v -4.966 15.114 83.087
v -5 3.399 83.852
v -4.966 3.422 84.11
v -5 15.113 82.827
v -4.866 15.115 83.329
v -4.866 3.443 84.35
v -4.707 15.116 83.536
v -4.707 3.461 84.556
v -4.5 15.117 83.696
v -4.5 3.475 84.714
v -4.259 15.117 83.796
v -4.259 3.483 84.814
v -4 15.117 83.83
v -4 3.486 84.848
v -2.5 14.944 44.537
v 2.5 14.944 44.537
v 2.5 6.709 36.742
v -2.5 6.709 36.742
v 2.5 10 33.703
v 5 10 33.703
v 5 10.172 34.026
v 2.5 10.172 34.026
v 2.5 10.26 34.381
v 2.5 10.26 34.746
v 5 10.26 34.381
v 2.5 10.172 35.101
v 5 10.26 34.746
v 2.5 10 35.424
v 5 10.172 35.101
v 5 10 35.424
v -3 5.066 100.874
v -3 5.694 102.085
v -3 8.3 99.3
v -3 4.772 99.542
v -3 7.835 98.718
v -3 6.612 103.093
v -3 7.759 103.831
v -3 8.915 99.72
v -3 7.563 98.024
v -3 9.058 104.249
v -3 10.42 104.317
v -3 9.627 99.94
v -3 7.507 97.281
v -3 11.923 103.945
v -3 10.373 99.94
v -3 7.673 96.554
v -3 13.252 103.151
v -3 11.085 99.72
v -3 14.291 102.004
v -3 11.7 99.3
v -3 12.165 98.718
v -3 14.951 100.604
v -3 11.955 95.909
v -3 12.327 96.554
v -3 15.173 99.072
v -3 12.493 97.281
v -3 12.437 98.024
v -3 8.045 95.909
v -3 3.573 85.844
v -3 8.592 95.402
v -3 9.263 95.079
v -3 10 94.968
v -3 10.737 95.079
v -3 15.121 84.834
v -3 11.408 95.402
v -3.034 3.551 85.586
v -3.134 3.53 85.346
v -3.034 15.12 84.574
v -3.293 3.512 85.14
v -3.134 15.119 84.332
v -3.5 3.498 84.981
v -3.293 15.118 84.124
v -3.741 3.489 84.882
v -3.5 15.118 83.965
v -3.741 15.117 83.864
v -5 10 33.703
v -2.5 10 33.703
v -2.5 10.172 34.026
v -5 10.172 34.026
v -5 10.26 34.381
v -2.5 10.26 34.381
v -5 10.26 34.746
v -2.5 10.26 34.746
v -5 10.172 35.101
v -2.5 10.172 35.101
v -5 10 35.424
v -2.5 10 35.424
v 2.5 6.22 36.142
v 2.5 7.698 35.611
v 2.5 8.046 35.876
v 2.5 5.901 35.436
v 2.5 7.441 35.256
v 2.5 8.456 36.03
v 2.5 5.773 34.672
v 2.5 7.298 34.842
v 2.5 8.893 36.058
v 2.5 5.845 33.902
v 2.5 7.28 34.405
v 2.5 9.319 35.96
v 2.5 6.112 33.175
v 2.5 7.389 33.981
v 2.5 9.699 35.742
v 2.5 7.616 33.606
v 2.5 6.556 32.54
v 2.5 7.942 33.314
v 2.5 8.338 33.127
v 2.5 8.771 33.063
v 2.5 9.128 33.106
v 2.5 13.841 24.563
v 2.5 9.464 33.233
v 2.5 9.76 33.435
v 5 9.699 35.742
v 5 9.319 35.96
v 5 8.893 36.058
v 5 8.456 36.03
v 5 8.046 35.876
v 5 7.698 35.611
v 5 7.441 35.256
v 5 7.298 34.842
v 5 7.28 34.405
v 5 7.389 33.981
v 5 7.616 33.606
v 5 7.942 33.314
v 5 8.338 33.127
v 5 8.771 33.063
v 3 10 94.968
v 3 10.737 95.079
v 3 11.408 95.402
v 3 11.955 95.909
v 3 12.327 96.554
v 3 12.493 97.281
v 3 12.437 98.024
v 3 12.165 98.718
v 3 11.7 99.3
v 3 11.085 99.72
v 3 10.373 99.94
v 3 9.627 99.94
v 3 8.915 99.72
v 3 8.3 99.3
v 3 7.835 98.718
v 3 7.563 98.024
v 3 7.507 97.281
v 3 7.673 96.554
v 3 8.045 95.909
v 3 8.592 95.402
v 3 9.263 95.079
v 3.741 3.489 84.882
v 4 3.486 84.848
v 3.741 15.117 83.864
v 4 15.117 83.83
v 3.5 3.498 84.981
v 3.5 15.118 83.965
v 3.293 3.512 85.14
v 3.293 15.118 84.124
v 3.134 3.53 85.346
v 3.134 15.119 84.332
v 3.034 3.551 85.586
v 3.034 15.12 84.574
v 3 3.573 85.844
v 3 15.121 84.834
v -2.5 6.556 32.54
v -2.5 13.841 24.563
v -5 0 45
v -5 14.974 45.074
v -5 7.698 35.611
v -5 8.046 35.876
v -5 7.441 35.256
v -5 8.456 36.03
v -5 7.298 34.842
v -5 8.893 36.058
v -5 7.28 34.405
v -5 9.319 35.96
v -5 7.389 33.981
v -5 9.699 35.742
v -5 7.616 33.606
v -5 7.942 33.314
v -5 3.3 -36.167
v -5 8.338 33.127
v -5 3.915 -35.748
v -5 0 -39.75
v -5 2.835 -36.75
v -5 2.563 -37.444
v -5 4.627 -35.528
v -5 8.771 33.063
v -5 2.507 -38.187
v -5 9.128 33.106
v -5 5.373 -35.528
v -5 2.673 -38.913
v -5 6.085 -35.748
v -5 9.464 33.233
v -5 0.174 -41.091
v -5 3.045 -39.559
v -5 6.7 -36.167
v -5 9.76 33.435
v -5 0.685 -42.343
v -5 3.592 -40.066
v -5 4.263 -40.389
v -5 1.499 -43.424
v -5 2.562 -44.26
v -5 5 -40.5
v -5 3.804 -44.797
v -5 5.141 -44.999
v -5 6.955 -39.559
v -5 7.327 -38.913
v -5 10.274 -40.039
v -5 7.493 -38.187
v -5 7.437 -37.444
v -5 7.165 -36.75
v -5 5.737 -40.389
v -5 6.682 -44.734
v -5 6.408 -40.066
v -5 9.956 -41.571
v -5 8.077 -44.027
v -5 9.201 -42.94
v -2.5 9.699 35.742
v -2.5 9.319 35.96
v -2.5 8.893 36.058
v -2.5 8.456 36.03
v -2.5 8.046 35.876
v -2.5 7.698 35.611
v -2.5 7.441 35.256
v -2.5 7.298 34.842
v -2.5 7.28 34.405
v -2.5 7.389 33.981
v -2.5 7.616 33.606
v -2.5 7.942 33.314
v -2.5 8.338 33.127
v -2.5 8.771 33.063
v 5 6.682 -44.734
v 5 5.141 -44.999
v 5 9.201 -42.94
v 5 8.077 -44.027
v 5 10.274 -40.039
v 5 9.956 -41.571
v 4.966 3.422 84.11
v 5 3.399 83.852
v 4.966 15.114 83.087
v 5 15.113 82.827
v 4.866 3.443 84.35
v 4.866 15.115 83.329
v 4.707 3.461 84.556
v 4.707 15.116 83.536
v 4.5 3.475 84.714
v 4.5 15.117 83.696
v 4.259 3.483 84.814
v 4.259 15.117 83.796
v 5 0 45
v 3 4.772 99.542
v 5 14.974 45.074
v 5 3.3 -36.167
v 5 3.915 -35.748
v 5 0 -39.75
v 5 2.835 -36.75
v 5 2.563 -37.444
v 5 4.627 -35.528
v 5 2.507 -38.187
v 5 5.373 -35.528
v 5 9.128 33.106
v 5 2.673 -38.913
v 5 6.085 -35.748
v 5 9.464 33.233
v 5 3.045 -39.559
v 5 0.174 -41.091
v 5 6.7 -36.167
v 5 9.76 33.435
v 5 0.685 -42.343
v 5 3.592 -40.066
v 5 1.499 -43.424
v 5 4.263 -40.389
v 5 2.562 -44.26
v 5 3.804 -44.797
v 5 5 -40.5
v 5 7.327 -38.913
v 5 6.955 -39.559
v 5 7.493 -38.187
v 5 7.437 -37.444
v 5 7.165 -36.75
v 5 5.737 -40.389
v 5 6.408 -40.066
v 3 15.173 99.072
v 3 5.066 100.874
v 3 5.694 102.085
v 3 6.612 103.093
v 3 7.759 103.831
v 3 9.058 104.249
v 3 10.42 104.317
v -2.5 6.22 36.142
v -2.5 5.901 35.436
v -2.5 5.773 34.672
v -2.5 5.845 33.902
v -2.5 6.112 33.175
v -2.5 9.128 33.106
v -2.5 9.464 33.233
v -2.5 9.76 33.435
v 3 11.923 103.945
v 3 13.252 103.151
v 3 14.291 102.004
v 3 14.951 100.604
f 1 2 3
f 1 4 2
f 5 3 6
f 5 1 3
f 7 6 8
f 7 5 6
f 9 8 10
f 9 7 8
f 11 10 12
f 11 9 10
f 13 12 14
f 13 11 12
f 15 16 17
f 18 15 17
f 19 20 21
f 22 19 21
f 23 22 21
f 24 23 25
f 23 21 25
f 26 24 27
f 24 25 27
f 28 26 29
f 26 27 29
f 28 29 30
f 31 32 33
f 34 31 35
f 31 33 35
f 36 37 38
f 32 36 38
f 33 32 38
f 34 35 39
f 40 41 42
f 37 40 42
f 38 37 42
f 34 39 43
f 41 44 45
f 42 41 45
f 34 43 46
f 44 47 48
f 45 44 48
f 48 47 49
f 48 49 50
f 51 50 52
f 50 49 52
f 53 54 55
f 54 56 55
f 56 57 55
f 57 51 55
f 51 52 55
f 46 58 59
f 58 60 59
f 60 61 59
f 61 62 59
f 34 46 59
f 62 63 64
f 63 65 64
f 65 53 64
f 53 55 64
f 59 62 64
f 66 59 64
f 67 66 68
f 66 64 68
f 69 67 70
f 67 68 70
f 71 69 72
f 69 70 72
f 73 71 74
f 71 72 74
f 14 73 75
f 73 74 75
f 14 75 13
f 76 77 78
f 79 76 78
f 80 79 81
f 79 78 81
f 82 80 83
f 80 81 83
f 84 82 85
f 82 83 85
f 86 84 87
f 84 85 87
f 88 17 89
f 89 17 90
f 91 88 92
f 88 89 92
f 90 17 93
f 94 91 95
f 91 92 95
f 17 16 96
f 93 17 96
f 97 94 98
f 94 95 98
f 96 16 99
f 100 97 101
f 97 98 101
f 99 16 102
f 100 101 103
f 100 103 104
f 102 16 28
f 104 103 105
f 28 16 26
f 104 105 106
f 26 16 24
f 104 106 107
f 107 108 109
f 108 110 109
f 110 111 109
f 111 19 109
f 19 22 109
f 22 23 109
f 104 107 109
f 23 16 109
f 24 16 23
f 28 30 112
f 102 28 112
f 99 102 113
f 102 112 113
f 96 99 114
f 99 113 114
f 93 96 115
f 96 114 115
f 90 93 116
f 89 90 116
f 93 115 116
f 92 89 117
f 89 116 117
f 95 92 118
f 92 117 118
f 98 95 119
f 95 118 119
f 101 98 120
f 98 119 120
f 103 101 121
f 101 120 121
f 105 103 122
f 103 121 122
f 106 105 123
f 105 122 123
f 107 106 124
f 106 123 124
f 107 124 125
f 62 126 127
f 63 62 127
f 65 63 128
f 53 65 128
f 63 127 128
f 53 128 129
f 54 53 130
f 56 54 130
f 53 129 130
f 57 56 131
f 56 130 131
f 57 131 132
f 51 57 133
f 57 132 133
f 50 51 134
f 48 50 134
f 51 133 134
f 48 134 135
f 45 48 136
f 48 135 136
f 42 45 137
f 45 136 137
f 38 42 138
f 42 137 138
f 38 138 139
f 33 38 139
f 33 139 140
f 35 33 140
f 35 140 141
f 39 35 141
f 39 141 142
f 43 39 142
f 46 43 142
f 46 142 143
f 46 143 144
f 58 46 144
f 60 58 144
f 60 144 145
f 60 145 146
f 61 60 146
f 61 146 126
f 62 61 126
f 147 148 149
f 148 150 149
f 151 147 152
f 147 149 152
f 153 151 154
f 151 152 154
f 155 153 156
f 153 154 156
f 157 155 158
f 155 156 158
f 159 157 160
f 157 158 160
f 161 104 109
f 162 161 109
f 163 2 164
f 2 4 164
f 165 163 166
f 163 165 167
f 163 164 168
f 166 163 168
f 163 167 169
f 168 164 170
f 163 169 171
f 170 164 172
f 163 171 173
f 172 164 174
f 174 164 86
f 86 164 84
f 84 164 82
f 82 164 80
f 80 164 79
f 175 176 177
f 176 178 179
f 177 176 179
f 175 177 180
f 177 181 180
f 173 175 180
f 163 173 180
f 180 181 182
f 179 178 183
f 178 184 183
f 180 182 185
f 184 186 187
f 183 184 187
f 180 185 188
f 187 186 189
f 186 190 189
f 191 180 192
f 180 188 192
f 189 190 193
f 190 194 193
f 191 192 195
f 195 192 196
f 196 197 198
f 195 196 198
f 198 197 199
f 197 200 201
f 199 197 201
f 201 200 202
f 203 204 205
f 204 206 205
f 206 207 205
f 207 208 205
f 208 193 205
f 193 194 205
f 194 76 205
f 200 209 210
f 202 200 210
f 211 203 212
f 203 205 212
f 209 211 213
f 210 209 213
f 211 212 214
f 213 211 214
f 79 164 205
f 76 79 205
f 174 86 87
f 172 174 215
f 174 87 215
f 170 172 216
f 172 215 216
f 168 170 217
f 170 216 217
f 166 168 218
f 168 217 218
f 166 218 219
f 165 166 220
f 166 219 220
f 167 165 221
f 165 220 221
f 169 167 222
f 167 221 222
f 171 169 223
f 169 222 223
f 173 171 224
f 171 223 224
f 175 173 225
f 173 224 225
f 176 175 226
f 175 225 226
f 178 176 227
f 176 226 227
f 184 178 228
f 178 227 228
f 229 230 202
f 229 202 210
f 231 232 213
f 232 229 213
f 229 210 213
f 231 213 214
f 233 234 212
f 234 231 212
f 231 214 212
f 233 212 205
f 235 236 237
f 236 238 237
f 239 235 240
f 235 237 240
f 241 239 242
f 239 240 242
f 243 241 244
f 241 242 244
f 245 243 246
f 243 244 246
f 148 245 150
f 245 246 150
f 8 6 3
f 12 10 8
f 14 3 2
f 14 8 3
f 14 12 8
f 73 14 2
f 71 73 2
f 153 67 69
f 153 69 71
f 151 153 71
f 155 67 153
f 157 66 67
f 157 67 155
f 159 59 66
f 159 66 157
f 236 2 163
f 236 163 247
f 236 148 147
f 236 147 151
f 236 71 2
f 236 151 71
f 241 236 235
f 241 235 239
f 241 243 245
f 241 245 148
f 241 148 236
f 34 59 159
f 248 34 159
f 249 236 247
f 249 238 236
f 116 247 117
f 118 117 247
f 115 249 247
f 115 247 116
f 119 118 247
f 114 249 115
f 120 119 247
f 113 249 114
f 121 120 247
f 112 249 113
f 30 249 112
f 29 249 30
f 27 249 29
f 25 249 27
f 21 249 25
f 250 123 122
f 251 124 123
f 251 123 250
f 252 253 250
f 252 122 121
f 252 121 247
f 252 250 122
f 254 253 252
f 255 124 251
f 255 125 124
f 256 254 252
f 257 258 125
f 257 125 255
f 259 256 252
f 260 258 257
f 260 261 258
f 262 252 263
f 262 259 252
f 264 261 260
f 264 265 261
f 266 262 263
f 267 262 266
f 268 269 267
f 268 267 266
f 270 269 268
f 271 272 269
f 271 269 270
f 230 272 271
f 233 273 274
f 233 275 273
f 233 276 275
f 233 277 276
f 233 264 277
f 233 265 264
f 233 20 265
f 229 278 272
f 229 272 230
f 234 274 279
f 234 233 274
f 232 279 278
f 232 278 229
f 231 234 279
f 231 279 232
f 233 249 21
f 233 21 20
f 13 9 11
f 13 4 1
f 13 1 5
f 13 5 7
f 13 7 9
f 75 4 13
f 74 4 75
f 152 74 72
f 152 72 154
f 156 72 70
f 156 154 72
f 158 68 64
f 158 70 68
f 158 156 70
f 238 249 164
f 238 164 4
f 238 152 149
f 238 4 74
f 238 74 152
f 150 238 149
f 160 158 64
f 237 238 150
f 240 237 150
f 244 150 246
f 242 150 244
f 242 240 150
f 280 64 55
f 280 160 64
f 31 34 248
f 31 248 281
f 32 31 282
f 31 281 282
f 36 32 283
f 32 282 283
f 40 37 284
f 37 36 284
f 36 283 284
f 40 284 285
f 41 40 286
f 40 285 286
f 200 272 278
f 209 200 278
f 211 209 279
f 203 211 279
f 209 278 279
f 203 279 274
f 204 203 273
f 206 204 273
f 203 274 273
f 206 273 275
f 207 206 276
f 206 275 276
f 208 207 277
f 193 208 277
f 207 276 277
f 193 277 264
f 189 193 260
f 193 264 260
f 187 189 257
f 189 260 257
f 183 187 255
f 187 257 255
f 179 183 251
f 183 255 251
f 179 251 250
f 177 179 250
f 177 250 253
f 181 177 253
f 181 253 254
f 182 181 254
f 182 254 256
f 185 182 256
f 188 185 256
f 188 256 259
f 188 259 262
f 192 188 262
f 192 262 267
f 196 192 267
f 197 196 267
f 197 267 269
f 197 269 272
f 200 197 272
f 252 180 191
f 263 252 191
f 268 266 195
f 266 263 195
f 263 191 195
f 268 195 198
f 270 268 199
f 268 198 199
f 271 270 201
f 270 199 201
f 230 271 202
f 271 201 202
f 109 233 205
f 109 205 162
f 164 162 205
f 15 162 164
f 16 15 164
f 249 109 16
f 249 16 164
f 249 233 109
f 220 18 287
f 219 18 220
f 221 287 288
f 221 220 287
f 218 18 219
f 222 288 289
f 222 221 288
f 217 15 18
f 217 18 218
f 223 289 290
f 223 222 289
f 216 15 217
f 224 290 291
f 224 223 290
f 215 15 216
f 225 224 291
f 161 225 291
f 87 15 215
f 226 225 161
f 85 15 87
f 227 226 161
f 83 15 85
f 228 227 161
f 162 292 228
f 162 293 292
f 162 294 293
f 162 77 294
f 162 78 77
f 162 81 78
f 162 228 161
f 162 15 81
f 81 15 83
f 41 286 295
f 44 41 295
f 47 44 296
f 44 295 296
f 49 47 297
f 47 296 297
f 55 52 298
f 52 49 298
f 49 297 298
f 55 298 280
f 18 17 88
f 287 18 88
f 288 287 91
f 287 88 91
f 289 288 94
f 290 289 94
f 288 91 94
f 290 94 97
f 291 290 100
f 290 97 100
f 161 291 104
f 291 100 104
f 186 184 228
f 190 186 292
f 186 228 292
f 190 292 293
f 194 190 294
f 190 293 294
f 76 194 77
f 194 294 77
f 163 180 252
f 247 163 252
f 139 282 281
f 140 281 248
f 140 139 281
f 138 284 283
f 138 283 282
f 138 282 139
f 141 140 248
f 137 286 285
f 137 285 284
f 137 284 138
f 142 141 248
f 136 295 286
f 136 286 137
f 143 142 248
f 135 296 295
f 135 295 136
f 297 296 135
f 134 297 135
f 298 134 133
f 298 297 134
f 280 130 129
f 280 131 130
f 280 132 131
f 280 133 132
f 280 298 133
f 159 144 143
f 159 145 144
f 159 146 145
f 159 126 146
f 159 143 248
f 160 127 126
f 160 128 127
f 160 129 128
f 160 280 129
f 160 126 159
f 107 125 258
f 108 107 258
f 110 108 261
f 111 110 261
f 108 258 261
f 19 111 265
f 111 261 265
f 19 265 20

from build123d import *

# Parameters (mm, degrees)
SKETCH2_W           = 10
SKETCH2_H           = 90
BOSS_EXTRUDE1_DEPTH = 10
SKETCH3_W           = 10
SKETCH3_H           = 60
BOSS_EXTRUDE2_DEPTH = 10
BOSS_EXTRUDE3_DEPTH = 10
CUT_EXTRUDE5_START  = -8
CUT_EXTRUDE5_DEPTH  = 2
CUT_EXTRUDE6_DEPTH  = 2
SKETCH4_3_R         = 2.5
CUT_EXTRUDE1_DEPTH  = 10
CUT_EXTRUDE2_START  = -2.5
SKETCH4_5_R         = 1.5
CUT_EXTRUDE2_DEPTH  = 5
CUT_EXTRUDE3_DEPTH  = 107.338519192
FILLET3_R           = 5.25
FILLET4_R           = 5.25
SKETCH4_7_R         = 2.5
CUT_EXTRUDE4_DEPTH  = 106.904850242
FILLET5_R           = 1


# Some blends are built 0.0001 mm under size
with BuildPart() as part:
    # Sketch2 → Boss-Extrude1 (new body)
    with BuildSketch(Plane(origin=(0, 0, 0), x_dir=(1, 0, 0), z_dir=(0, 1, 0))):
        Rectangle(SKETCH2_W, SKETCH2_H)
    extrude(amount=BOSS_EXTRUDE1_DEPTH)

    # Sketch3 → Boss-Extrude2 (add)
    with BuildSketch(Plane(origin=(0, -3.907083998, 0.341825557), x_dir=(1, 0, 0), z_dir=(0, -0.9961946980917459, 0.08715574274765504))):
        with Locations((0, 74.828761414)):
            Rectangle(SKETCH3_W, SKETCH3_H)
    extrude(amount=-BOSS_EXTRUDE2_DEPTH)

    # Sketch4 → Boss-Extrude3 (add)
    with BuildSketch(Plane(origin=(5, 0, 0), x_dir=(0, 0, -1), z_dir=(1, 0, 0))):
        Polygon((-103.900124458, 15.191291546), (-44.563390571, 10), (45, 10), (-45.073853215, 14.973874535), align=None)
    extrude(amount=-BOSS_EXTRUDE3_DEPTH)

    # Sketch6 → Cut-Extrude5 (cut)
    with BuildSketch(Plane(origin=(5, 0, 0), x_dir=(0, 0, -1), z_dir=(1, 0, 0)).offset(CUT_EXTRUDE5_START)):
        Polygon((-103.900124458, 15.191291546), (-104.771681886, 5.229344565), (-84.847787924, 3.48622971), (-83.830217328, 15.117114837), align=None)
    extrude(amount=-CUT_EXTRUDE5_DEPTH, mode=Mode.SUBTRACT)

    # Sketch6<2> → Cut-Extrude6 (cut)
    with BuildSketch(Plane(origin=(5, 0, 0), x_dir=(0, 0, -1), z_dir=(1, 0, 0))):
        Polygon((-103.900124458, 15.191291546), (-104.771681886, 5.229344565), (-84.847787924, 3.48622971), (-83.830217328, 15.117114837), align=None)
    extrude(amount=-CUT_EXTRUDE6_DEPTH, mode=Mode.SUBTRACT)

    # Sketch4<3> → Cut-Extrude1 (cut)
    with BuildSketch(Plane(origin=(5, 0, 0), x_dir=(0, 0, -1), z_dir=(1, 0, 0))):
        with Locations((-97.467522719, 10)):
            Circle(SKETCH4_3_R)
    extrude(amount=-CUT_EXTRUDE1_DEPTH, mode=Mode.SUBTRACT)

    # Sketch4<5> → Cut-Extrude2 (cut)
    with BuildSketch(Plane(origin=(5, 0, 0), x_dir=(0, 0, -1), z_dir=(1, 0, 0)).offset(CUT_EXTRUDE2_START)):
        with BuildLine():
            Line((-44.537121893, 14.944236253), (-36.742124975, 6.709179338))
            ThreePointArc((-36.742124975, 6.709179338), (-34.672491645, 5.773472347), (-32.540320007, 6.556271045))
            Line((-32.540320007, 6.556271045), (-24.563390571, 13.841287616))
            Line((-24.563390571, 13.841287616), (-44.537121893, 14.944236253))
        make_face()
        with Locations((-34.563390571, 8.77148785)):
            Circle(SKETCH4_5_R, mode=Mode.SUBTRACT)
    extrude(amount=-CUT_EXTRUDE2_DEPTH, mode=Mode.SUBTRACT)

    # Sketch4<6> → Cut-Extrude3 (cut, through all)
    with BuildSketch(Plane(origin=(5, 0, 0), x_dir=(0, 0, -1), z_dir=(1, 0, 0))):
        with BuildLine():
            ThreePointArc((-33.702717638, 10), (-34.563390571, 10.27148785), (-35.424063503, 10))
            Line((-35.424063503, 10), (-33.702717638, 10))
        make_face()
        with BuildLine():
            Line((-33.702717638, 10), (-35.424063503, 10))
            ThreePointArc((-35.424063503, 10), (-35.255846563, 7.440884716), (-33.063390571, 8.77148785))
            ThreePointArc((-33.063390571, 8.77148785), (-33.232787437, 9.463943842), (-33.702717638, 10))
        make_face()
    extrude(amount=-CUT_EXTRUDE3_DEPTH, mode=Mode.SUBTRACT)

    # Fillet3
    # the kernel refuses this fillet: 5.25 mm, written as the material it takes off along each edge
    with BuildSketch(Plane(origin=(16.125, 5.229344565, 104.771681886), x_dir=(0, -0.08715574274765522, -0.9961946980917458), z_dir=(-1, 0, 0))) as fillet3_piece_1:
        with BuildLine():
            CenterArc((FILLET3_R, -FILLET3_R), FILLET3_R, 90, 90)
            Line((0, -FILLET3_R), (0, 0))
            Line((0, 0), (FILLET3_R, 0))
        make_face()
    extrude(amount=32.25, mode=Mode.SUBTRACT)
    with BuildSketch(Plane(origin=(15.07154221, 15.191291546, 103.900124458), x_dir=(0, -0.003695891671652919, -0.9999931701690523), z_dir=(-1, 0, 0))) as fillet3_piece_2:
        with BuildLine():
            CenterArc((FILLET3_R * 0.91973654932, FILLET3_R), FILLET3_R, 184.788240524, 85.211759476)
            Line((-FILLET3_R * 0.0767734631138, FILLET3_R * 0.916526680199), (0, 0))
            Line((0, 0), (FILLET3_R * 0.91973654932, 0))
        make_face()
    extrude(amount=30.14308442, mode=Mode.SUBTRACT)

    # Fillet4
    # the kernel refuses this fillet: 5.25 mm, written as the material it takes off along each edge
    with BuildSketch(Plane(origin=(-18.125, 0, -45), x_dir=(0, 1, 0), z_dir=(1, 0, 0))) as fillet4_piece_1:
        with BuildLine():
            CenterArc((FILLET4_R, FILLET4_R), FILLET4_R, 180, 90)
            Line((0, FILLET4_R), (0, 0))
            Line((0, 0), (FILLET4_R, 0))
        make_face()
    extrude(amount=36.25, mode=Mode.SUBTRACT)
    with BuildSketch(Plane(origin=(-17.420233463, 10, -45), x_dir=(0, -1, 0), z_dir=(1, 0, 0))) as fillet4_piece_2:
        with BuildLine():
            CenterArc((FILLET4_R * 0.946303501909, -FILLET4_R), FILLET4_R, 90, 86.839339304)
            Line((-FILLET4_R * 0.0521753539947, -FILLET4_R * 0.944864037923), (0, 0))
            Line((0, 0), (FILLET4_R * 0.946303501909, 0))
        make_face()
    extrude(amount=34.840466925, mode=Mode.SUBTRACT)

    # Sketch4<7> → Cut-Extrude4 (cut, through all)
    with BuildSketch(Plane(origin=(5, 0, 0), x_dir=(0, 0, -1), z_dir=(1, 0, 0))):
        with Locations((38, 5)):
            Circle(SKETCH4_7_R)
    extrude(amount=-CUT_EXTRUDE4_DEPTH, mode=Mode.SUBTRACT)

    # Fillet5
    fillet5_edges = [part.edges().sort_by_distance(p)[0] for p in [
        (-3, 9.301672273, 84.339002626),
        (-5, 9.301672273, 84.339002626),
        (3, 9.301672273, 84.339002626),
        (5, 9.301672273, 84.339002626),
    ]]
    fillet(fillet5_edges, radius=FILLET5_R - 0.0001)  # a hair under: the kernel refuses the full size


solid = part.part
